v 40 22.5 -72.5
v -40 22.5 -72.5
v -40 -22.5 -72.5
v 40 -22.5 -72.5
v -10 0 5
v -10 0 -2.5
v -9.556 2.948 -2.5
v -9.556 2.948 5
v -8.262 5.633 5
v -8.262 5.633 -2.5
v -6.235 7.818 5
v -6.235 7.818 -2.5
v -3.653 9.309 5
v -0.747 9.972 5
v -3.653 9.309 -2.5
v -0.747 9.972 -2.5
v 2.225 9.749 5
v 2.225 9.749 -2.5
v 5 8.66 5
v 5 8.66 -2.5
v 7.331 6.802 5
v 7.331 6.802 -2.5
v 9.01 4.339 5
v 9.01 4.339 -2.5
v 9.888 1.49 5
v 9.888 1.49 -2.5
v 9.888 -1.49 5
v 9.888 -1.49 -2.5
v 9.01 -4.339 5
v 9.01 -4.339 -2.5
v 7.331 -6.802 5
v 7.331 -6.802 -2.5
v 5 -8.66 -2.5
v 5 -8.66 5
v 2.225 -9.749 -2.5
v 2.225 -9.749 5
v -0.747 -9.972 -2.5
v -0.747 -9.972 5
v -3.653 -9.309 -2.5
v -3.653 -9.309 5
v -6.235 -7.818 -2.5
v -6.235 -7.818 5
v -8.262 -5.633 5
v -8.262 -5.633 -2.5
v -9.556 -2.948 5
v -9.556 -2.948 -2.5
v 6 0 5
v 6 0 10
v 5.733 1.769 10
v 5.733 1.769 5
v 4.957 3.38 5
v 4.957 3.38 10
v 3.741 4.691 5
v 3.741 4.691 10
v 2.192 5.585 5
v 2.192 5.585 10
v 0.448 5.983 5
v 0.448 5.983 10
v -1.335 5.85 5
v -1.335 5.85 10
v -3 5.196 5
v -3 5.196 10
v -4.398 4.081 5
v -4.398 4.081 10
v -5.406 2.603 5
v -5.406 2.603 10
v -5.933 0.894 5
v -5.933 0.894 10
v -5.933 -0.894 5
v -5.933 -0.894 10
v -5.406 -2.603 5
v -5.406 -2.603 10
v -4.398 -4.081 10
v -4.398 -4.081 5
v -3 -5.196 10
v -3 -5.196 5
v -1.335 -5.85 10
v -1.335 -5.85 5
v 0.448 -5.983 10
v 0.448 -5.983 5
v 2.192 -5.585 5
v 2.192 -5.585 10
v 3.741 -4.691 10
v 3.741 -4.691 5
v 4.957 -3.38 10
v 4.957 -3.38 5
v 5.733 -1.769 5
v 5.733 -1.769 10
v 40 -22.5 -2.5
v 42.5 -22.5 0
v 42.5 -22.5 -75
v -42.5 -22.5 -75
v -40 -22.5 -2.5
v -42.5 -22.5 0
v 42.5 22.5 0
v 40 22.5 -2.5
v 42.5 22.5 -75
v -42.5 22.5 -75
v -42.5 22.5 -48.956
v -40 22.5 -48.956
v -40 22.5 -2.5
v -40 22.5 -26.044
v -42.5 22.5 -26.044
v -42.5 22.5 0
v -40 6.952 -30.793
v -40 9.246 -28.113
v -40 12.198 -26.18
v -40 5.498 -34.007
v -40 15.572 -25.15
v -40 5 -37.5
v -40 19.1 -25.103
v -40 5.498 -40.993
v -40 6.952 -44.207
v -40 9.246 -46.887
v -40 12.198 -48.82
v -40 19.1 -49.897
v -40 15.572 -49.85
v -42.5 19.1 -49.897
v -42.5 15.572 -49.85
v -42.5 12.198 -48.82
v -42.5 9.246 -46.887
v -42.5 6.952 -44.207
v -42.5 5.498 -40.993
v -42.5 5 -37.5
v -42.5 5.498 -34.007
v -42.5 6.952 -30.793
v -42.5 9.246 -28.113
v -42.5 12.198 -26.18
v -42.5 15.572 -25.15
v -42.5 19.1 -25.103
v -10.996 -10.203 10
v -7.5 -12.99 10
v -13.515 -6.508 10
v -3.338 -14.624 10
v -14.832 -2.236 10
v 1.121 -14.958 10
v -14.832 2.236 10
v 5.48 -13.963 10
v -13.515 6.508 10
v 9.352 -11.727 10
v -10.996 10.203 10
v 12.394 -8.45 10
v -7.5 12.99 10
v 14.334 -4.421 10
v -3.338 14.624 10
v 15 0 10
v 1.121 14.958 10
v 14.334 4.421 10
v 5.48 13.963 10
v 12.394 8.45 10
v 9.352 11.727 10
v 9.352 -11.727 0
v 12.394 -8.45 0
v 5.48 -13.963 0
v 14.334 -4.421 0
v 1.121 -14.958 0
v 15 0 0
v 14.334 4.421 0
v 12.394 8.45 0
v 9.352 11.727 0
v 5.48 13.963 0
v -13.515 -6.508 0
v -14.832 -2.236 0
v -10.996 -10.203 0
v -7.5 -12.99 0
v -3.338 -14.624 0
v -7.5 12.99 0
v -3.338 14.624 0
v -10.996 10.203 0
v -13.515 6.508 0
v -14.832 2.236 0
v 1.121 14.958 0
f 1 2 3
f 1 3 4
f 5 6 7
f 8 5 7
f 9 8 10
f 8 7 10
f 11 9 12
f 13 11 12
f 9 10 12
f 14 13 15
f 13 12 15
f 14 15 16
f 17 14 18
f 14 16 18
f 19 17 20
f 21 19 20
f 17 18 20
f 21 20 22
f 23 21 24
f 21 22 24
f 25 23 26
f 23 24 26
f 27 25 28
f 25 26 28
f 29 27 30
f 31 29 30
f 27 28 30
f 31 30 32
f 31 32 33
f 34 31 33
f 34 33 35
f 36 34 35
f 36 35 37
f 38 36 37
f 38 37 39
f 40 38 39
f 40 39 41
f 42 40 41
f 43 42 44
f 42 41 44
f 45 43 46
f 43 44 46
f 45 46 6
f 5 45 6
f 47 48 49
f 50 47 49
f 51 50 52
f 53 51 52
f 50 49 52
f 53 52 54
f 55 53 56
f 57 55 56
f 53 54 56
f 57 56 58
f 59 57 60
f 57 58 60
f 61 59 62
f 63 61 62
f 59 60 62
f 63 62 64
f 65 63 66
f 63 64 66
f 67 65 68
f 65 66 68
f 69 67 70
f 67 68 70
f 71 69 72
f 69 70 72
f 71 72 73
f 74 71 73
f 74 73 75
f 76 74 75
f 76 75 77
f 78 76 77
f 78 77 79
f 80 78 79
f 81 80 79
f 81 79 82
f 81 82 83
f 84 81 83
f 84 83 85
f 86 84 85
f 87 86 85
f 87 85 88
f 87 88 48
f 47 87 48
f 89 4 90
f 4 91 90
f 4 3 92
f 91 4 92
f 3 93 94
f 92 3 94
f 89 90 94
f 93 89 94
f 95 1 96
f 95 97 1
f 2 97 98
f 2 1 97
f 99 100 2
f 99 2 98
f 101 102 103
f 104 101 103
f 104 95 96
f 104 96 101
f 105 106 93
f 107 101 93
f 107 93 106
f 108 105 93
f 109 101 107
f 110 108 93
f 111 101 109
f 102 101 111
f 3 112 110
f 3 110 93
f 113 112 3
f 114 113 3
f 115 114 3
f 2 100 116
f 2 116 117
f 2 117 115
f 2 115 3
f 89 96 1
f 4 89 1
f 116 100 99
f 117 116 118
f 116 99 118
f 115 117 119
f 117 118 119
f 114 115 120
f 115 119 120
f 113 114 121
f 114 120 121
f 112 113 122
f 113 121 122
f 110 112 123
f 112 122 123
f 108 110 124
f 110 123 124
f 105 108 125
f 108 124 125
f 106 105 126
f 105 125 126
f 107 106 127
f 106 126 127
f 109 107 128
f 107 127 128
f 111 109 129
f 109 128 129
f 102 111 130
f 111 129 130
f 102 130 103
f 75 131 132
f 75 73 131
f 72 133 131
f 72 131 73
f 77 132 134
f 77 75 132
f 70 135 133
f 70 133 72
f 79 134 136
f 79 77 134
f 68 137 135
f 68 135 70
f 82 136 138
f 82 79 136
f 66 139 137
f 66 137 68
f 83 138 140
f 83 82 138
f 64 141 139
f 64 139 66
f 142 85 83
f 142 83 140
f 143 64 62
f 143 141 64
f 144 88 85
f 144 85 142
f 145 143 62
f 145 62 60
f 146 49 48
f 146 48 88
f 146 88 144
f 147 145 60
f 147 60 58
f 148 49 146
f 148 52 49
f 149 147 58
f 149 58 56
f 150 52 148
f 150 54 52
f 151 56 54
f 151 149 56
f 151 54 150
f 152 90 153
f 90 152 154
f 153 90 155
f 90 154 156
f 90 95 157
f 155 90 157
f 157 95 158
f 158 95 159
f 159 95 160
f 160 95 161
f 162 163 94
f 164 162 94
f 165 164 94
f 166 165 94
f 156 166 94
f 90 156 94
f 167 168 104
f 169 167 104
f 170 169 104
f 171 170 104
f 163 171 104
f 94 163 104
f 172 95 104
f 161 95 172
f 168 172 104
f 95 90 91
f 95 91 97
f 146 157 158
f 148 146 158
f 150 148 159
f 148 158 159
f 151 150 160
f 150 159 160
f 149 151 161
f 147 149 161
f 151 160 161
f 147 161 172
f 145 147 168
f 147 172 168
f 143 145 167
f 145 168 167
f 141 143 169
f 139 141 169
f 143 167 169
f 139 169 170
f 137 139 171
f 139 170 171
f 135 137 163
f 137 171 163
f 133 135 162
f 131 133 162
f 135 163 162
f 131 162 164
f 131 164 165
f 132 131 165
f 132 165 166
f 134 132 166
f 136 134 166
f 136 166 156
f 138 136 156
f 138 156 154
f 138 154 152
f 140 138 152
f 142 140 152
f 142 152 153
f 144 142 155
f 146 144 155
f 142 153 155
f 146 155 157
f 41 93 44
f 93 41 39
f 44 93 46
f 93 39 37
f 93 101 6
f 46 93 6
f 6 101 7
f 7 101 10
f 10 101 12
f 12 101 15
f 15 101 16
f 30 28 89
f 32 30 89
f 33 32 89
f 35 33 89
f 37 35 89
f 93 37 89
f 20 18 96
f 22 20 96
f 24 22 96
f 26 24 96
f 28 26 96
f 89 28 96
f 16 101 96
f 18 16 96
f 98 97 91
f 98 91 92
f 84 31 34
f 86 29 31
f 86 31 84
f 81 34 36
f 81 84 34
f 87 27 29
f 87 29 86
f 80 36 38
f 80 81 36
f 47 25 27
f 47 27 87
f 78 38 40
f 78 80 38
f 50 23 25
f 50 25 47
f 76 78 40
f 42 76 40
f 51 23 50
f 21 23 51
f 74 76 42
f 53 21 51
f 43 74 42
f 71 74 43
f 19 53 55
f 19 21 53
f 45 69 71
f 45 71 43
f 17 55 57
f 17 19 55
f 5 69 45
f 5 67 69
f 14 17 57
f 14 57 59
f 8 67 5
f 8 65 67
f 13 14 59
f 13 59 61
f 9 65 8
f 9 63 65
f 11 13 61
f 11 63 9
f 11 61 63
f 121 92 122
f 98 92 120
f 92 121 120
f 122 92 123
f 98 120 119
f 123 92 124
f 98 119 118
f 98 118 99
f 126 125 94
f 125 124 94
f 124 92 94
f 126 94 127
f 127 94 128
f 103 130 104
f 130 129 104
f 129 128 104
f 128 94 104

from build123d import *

# Parameters (mm, degrees)
SKETCH2_R           = 15
BOSS_EXTRUDE1_DEPTH = 10
SKETCH4_W           = 85
SKETCH4_H           = 45
BOSS_EXTRUDE2_DEPTH = 75
CUT_EXTRUDE3_REACH  = 47
SKETCH5_W           = 80
SKETCH5_H           = 70
CUT_EXTRUDE1_REACH  = 87
SKETCH3_R           = 6
SKETCH6_R           = 10
CUT_EXTRUDE4_DEPTH  = 7.5
CUT_EXTRUDE5_REACH  = 87
SKETCH7_R           = 12.5


with BuildPart() as part:
    # Sketch2 → Boss-Extrude1 (new body)
    with BuildSketch(Plane.XY):
        Circle(SKETCH2_R)
    extrude(amount=BOSS_EXTRUDE1_DEPTH)

    # Sketch4 → Boss-Extrude2 (add)
    with BuildSketch(Plane(origin=(0, 0, 0), x_dir=(-1, 0, 0), z_dir=(0, 0, -1))):
        Rectangle(SKETCH4_W, SKETCH4_H)
    extrude(amount=BOSS_EXTRUDE2_DEPTH)

    # Sketch5 → Cut-Extrude3 (cut, up to next)
    with BuildSketch(Plane(origin=(0, 22.5, 0), x_dir=(1, 0, 0), z_dir=(0, 1, 0)), mode=Mode.PRIVATE) as cut_extrude3_sk1:
        with Locations((0, 37.5)):
            Rectangle(SKETCH5_W, SKETCH5_H)
    cut_extrude3_tool1 = extrude(cut_extrude3_sk1.sketch, amount=-CUT_EXTRUDE3_REACH, mode=Mode.PRIVATE) & part.part
    add(cut_extrude3_tool1.solids().sort_by_distance((0, 22.5, -37.5))[0], mode=Mode.SUBTRACT)

    # Sketch3 → Cut-Extrude1 (cut, up to next)
    with BuildSketch(Plane.XY.offset(10), mode=Mode.PRIVATE) as cut_extrude1_sk1:
        Circle(SKETCH3_R)
    cut_extrude1_tool1 = extrude(cut_extrude1_sk1.sketch, amount=-CUT_EXTRUDE1_REACH, mode=Mode.PRIVATE) & part.part
    add(cut_extrude1_tool1.solids().sort_by_distance((0, 0, 10))[0], mode=Mode.SUBTRACT)

    # Sketch6 → Cut-Extrude4 (cut)
    with BuildSketch(Plane(origin=(0, 0, -2.5), x_dir=(-1, 0, 0), z_dir=(0, 0, -1))):
        Circle(SKETCH6_R)
    extrude(amount=-CUT_EXTRUDE4_DEPTH, mode=Mode.SUBTRACT)

    # Sketch7 → Cut-Extrude5 (cut, up to next)
    with BuildSketch(Plane.ZY.offset(42.5), mode=Mode.PRIVATE) as cut_extrude5_sk1:
        with Locations((-37.5, 17.5)):
            Circle(SKETCH7_R)
    cut_extrude5_tool1 = extrude(cut_extrude5_sk1.sketch, amount=-CUT_EXTRUDE5_REACH, mode=Mode.PRIVATE) & part.part
    add(cut_extrude5_tool1.solids().sort_by_distance((-42.5, 17.5, -37.5))[0], mode=Mode.SUBTRACT)


solid = part.part
